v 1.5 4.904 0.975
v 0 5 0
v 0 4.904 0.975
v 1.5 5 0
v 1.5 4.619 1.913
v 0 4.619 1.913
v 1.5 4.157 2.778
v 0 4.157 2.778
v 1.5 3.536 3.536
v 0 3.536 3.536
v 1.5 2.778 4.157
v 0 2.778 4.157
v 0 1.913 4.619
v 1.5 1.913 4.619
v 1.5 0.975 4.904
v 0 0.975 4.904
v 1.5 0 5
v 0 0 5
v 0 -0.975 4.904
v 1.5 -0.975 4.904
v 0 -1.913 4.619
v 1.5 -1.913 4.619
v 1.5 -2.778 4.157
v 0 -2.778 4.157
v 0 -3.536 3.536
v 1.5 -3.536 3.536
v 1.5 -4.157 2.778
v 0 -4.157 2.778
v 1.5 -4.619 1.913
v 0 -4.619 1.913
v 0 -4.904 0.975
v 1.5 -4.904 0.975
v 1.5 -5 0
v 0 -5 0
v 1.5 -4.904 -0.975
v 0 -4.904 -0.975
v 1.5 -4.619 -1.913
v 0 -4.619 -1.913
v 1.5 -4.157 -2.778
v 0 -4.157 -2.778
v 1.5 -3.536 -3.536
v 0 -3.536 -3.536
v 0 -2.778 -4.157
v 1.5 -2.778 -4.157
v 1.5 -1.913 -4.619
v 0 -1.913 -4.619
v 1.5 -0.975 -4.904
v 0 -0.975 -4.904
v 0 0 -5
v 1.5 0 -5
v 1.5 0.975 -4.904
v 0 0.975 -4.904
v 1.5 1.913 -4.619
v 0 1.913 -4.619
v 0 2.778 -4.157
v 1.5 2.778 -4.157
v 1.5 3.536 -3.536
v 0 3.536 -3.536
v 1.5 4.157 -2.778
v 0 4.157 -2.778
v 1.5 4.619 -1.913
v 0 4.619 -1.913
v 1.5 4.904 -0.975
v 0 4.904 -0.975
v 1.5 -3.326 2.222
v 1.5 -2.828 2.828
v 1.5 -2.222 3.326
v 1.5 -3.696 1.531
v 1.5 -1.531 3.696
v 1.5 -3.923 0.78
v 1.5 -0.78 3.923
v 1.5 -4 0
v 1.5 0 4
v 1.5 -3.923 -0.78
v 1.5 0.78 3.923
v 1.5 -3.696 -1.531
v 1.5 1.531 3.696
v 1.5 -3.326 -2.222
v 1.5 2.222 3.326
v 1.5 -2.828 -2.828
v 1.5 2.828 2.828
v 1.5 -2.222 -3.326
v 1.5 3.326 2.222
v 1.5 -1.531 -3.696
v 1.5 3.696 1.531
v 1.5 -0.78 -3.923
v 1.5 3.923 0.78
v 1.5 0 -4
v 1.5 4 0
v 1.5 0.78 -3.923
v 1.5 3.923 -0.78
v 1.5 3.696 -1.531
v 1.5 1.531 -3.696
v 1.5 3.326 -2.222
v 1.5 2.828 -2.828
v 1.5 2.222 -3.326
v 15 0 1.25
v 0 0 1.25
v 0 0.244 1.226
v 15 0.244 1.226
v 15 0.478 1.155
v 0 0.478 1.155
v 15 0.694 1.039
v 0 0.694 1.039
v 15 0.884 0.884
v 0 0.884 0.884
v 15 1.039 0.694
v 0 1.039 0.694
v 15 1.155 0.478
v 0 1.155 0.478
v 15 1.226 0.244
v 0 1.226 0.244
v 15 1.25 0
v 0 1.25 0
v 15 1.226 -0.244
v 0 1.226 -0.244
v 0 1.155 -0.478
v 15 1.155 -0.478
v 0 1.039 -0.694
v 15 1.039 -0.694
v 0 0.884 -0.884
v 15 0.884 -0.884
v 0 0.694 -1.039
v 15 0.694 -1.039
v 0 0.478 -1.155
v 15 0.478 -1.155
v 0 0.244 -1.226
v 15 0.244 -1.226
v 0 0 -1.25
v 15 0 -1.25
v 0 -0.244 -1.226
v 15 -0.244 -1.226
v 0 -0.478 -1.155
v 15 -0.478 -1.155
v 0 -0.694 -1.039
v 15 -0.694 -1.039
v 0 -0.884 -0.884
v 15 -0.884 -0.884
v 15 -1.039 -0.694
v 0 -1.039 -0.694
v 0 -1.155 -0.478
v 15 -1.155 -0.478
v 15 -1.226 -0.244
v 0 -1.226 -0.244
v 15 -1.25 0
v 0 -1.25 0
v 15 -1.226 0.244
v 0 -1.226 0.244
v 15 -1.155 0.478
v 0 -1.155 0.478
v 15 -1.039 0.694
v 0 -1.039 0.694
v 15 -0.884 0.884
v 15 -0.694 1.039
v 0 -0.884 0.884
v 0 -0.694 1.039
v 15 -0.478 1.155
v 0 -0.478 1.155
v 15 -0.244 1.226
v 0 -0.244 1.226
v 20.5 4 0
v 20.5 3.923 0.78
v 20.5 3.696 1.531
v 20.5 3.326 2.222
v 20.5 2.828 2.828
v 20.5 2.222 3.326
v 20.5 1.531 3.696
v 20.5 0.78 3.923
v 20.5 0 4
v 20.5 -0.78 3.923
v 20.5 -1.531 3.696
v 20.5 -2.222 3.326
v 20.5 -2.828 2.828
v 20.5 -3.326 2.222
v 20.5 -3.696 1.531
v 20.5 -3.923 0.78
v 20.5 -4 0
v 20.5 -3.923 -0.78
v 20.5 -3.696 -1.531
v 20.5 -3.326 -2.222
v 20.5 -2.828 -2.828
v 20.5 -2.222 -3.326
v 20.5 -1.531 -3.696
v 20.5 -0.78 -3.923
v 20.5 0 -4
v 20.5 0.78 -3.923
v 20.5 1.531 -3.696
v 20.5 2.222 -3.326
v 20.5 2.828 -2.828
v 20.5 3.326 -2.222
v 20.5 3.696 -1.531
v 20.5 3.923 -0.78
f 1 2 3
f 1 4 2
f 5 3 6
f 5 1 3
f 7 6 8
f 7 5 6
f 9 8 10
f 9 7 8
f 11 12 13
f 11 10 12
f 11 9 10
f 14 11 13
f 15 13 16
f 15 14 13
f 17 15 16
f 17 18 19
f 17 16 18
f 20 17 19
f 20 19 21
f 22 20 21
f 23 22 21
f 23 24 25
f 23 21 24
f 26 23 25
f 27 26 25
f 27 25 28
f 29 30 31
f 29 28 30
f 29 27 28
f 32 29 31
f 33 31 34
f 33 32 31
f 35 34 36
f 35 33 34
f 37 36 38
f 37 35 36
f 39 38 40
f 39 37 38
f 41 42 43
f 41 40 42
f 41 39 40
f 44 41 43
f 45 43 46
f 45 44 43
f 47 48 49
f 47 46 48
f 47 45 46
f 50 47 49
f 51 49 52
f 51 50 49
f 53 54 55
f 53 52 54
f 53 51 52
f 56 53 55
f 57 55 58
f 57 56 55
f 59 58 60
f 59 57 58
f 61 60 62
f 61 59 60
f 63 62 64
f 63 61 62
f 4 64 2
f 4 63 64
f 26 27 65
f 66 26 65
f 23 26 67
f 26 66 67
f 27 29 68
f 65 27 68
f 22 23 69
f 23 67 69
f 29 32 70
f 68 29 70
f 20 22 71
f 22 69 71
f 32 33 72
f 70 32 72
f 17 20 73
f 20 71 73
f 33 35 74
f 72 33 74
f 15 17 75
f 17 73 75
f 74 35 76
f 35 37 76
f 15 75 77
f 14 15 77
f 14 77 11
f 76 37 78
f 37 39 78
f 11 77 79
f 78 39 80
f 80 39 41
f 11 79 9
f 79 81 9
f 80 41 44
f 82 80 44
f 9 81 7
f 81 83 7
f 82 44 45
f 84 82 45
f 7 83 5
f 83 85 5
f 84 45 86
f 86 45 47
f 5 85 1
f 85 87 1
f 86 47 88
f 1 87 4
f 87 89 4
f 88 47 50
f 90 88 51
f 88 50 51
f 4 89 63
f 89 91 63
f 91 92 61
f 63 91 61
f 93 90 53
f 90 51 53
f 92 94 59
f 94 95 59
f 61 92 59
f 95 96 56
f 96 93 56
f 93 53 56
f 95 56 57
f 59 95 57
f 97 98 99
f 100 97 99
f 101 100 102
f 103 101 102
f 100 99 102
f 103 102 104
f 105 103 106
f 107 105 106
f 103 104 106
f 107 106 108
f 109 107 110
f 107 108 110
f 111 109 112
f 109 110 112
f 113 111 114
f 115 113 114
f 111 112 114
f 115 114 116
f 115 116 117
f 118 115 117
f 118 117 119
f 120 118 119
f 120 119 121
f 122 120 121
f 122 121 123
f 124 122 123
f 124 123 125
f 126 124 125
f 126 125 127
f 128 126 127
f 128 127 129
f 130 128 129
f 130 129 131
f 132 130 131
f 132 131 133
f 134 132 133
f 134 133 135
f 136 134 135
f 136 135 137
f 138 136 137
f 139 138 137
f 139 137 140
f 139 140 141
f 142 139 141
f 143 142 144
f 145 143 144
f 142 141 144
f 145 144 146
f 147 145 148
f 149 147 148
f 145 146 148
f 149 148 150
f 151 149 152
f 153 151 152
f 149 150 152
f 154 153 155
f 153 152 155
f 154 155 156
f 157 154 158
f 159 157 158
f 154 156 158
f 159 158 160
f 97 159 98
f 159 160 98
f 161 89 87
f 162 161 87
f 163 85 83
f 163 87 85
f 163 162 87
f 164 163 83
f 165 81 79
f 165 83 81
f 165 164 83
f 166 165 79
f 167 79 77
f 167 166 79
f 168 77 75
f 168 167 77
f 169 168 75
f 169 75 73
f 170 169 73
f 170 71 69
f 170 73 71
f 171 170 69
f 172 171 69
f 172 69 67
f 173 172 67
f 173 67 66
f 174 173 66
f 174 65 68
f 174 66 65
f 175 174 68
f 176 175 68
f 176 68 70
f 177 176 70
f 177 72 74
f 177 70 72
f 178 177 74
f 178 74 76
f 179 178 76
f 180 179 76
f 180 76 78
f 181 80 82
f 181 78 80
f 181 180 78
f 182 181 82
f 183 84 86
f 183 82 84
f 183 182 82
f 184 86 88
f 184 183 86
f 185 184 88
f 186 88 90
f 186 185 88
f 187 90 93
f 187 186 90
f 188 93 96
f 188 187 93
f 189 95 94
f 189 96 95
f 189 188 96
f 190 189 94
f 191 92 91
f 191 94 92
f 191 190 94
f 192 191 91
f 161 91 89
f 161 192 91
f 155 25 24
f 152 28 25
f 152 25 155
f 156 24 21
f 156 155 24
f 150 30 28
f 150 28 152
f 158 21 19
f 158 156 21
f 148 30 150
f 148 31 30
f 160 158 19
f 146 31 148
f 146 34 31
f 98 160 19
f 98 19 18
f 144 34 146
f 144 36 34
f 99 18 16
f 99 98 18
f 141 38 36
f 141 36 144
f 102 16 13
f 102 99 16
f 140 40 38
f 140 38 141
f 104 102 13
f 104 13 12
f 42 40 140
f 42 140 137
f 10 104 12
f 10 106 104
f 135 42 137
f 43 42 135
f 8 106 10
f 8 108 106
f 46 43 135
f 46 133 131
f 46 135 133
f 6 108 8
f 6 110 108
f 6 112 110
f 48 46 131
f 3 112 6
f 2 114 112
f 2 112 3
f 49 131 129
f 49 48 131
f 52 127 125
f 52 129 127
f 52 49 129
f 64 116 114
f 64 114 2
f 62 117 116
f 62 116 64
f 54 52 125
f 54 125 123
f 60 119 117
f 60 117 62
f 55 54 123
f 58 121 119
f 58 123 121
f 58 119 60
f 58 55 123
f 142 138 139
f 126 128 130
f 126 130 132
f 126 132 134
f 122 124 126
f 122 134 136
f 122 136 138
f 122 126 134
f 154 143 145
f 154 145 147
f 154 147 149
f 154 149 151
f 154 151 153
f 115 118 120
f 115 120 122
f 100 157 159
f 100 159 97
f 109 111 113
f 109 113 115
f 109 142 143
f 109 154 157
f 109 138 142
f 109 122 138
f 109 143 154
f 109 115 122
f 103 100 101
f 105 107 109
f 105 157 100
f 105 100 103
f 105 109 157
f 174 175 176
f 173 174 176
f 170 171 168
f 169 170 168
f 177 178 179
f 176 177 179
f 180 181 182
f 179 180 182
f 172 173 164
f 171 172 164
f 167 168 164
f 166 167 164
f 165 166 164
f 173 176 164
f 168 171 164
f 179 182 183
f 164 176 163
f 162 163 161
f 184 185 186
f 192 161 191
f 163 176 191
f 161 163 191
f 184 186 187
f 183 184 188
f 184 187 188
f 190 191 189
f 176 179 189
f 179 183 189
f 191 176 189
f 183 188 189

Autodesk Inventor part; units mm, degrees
ref_plane "YZ Plane" through (0, 0, 0) normal (1, 0, 0) x (0, 1, 0)
ref_plane "XZ Plane" through (0, 0, 0) normal (0, 1, 0) x (-1, 0, 0)
ref_plane "XY Plane" through (0, 0, 0) normal (0, 0, 1) x (1, 0, 0)
sketch "スケッチ1" plane through (0, 0, 0) normal (0, 0, 1) x (1, 0, 0)
  line L0 (0, 0) -> (0, 5)
  line L1 (0, 5) -> (1.5, 5)
  line L2 (1.5, 5) -> (1.5, 4)
  line L3 (1.5, 4) -> (20.5, 4)
  line L4 (20.5, 4) -> (20.5, 0)
  line L5 (20.5, 0) -> (0, 0)
  dimension "d0" = 5
  dimension "d1" = 1.5
  dimension "d2" = 4
  dimension "d3" = 20.5
revolve "回転1" add sketch "スケッチ1" angle 360 about axis through (20.5, 0, 0) along (-1, 0, 0)
sketch "スケッチ2" plane through (0, 0, 0) normal (-1, 0, 0) x (0, 0, 1)
  circle A0 centre (0, 0) radius 1.25
  dimension "d5" = 2.5
extrude "押し出し1" cut sketch "スケッチ2" against normal blind 15
properties part number "Circuit_MJ165H"
